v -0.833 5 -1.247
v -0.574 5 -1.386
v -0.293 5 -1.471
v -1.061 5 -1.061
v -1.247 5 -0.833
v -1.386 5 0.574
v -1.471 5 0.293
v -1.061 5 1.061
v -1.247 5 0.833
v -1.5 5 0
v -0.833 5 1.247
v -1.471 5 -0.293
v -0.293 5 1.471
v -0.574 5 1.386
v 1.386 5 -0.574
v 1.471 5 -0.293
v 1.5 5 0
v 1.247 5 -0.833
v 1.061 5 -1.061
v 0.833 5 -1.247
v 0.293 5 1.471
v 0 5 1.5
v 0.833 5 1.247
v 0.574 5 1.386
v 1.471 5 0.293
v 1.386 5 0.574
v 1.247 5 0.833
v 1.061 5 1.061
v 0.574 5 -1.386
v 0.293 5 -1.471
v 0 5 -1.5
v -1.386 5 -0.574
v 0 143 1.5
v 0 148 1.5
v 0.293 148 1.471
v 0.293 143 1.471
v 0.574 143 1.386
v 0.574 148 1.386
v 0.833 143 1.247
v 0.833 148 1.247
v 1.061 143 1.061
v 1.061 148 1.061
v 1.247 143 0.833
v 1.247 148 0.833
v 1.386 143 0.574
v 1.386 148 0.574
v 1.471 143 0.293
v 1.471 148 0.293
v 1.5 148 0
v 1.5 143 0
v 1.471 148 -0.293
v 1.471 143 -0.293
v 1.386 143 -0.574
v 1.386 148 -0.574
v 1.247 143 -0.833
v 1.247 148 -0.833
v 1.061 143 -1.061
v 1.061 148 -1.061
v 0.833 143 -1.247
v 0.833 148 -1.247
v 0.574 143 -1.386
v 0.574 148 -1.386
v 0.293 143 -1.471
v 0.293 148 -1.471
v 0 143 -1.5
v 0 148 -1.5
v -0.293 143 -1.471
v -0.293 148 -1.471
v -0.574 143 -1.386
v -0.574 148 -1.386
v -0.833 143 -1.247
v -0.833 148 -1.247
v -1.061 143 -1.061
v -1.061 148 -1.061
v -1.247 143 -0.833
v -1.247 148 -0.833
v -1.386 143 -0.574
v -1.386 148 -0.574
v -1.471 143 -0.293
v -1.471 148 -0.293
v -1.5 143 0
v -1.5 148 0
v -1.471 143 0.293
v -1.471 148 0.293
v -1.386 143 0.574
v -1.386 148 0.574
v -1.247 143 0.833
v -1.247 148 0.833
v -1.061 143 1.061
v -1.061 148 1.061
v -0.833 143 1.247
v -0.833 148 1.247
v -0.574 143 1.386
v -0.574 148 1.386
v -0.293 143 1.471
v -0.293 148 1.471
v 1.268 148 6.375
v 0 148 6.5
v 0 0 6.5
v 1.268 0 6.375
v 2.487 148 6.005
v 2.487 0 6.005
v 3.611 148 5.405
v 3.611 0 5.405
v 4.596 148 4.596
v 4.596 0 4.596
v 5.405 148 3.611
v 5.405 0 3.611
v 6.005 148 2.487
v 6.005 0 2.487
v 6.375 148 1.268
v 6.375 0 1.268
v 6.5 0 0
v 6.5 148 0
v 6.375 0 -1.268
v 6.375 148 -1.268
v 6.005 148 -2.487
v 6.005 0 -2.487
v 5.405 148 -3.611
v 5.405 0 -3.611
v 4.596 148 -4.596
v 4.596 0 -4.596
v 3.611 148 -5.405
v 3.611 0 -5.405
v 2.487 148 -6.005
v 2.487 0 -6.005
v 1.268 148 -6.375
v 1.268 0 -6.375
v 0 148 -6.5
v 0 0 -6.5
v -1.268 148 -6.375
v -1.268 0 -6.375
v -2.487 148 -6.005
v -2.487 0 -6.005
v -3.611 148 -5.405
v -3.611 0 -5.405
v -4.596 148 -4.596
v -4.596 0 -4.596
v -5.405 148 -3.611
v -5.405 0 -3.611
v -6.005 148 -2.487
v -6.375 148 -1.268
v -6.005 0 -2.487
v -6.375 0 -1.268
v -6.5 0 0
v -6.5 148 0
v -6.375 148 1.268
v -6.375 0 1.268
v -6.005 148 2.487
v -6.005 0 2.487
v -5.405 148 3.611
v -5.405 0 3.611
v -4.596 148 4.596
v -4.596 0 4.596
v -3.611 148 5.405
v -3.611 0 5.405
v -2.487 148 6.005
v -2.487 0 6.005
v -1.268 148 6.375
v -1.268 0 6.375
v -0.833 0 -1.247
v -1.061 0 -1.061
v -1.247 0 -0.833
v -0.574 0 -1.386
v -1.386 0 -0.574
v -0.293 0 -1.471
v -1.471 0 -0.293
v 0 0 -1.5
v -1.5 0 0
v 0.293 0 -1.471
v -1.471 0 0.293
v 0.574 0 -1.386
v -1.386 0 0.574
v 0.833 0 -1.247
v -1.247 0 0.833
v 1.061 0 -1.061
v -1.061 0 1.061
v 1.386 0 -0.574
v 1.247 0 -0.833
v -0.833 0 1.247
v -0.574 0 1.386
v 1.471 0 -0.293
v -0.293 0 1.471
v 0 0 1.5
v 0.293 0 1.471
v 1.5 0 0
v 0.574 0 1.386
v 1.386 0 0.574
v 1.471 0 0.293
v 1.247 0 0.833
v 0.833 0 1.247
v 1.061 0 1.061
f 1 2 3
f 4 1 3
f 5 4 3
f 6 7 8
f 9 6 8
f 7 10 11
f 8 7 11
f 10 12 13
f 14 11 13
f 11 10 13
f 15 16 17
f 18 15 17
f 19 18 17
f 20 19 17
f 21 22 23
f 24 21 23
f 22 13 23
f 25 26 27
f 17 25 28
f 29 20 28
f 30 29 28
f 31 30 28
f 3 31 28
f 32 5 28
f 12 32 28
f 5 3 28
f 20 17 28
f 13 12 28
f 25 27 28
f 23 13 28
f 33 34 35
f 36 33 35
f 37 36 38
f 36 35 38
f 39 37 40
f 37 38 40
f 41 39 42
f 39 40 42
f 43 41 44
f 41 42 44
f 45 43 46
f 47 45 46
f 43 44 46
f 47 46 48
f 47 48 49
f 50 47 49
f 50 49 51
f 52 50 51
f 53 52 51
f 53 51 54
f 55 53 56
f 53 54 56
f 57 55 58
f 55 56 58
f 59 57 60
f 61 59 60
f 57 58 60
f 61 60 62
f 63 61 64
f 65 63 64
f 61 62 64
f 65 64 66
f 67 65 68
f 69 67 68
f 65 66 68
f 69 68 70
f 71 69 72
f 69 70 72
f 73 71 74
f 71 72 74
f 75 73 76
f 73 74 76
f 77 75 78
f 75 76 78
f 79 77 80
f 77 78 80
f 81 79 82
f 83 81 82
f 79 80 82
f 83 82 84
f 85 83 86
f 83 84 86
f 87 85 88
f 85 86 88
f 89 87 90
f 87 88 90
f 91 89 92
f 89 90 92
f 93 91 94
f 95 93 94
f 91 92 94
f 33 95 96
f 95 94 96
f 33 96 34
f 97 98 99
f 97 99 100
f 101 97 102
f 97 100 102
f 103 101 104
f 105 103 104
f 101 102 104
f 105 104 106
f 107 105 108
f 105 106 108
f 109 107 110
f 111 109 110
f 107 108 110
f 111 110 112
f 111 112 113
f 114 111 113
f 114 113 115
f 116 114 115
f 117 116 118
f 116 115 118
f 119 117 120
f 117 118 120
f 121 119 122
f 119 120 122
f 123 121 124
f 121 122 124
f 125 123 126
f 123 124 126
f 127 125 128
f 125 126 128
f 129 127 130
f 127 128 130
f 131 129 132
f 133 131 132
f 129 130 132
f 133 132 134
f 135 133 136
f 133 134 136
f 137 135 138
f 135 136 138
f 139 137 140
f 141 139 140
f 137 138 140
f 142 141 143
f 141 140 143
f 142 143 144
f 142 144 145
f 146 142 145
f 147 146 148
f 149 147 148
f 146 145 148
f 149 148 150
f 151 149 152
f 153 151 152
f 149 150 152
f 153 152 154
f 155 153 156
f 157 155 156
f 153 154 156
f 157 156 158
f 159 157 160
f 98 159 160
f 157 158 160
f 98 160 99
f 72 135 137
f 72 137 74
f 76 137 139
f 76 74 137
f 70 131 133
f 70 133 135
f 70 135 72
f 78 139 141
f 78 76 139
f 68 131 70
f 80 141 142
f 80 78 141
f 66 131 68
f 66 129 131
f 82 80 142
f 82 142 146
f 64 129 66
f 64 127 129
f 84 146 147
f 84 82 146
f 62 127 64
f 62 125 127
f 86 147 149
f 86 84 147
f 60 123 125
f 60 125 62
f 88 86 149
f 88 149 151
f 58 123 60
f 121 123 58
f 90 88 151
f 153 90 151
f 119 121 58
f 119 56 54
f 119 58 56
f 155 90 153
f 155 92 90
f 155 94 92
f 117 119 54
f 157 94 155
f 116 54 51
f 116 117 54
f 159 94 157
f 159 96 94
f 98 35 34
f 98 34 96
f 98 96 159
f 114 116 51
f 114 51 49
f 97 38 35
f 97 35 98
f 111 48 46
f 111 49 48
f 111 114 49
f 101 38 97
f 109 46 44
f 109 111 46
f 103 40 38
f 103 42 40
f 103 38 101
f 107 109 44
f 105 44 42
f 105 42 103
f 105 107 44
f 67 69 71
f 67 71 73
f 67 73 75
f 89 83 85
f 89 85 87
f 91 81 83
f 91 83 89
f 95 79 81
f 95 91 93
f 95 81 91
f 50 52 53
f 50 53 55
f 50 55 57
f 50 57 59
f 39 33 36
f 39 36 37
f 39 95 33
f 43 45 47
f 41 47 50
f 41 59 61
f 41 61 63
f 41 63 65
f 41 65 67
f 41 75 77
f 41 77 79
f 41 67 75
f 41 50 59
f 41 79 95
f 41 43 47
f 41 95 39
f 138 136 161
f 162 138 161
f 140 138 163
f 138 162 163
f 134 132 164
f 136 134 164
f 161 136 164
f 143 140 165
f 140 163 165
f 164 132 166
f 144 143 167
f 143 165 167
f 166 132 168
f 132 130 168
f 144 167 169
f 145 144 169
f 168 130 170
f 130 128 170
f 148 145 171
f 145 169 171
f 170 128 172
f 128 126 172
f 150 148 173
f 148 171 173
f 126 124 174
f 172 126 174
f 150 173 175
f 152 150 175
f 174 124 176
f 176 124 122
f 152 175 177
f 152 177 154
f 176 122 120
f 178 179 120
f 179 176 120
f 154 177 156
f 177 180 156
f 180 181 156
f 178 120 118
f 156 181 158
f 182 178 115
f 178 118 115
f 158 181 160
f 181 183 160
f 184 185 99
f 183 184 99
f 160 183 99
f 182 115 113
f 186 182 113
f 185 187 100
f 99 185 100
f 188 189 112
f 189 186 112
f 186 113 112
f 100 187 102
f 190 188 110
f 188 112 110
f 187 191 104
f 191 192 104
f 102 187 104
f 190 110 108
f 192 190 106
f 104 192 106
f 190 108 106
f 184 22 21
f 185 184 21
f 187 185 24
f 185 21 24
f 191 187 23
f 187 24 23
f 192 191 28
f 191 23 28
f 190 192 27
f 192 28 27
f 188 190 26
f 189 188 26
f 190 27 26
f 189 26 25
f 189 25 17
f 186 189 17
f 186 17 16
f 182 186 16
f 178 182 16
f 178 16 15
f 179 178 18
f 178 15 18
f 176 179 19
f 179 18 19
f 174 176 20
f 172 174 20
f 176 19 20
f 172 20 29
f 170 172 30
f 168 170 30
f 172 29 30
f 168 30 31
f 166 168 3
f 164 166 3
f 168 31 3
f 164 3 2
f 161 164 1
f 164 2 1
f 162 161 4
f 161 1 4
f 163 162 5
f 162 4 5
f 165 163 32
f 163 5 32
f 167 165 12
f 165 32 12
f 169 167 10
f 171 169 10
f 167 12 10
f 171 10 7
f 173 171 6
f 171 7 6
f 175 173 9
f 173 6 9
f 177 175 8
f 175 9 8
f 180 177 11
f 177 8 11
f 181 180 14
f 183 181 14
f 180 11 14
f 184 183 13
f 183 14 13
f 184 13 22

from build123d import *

# Parameters (mm, degrees)
SKETCH1_R           = 6.5
BOSS_EXTRUDE1_DEPTH = 148
SKETCH2_R           = 1.5
CUT_EXTRUDE1_DEPTH  = 5
LPATTERN1_COUNT     = 2
LPATTERN1_PITCH     = 143


with BuildPart() as part:
    # Sketch1 → Boss-Extrude1 (new body)
    with BuildSketch(Plane(origin=(0, 0, 0), x_dir=(1, 0, 0), z_dir=(0, 1, 0))):
        with Locations(Location((0, 0, 0), (0, 0, 270))):
            Circle(SKETCH1_R)
    extrude(amount=BOSS_EXTRUDE1_DEPTH)

    # Sketch2 → Cut-Extrude1 (cut)
    with BuildSketch(Plane(origin=(0, 148, 0), x_dir=(1, 0, 0), z_dir=(0, 1, 0))):
        with Locations(Location((0, 0, 0), (0, 0, 270))):
            Circle(SKETCH2_R)
    cut_extrude1 = extrude(amount=-CUT_EXTRUDE1_DEPTH, mode=Mode.SUBTRACT)

    # LPattern1: Cut-Extrude1 ×2
    with Locations(*[(0, -i * LPATTERN1_PITCH, 0) for i in range(1, LPATTERN1_COUNT)]):
        add(cut_extrude1, mode=Mode.SUBTRACT)


solid = part.part
